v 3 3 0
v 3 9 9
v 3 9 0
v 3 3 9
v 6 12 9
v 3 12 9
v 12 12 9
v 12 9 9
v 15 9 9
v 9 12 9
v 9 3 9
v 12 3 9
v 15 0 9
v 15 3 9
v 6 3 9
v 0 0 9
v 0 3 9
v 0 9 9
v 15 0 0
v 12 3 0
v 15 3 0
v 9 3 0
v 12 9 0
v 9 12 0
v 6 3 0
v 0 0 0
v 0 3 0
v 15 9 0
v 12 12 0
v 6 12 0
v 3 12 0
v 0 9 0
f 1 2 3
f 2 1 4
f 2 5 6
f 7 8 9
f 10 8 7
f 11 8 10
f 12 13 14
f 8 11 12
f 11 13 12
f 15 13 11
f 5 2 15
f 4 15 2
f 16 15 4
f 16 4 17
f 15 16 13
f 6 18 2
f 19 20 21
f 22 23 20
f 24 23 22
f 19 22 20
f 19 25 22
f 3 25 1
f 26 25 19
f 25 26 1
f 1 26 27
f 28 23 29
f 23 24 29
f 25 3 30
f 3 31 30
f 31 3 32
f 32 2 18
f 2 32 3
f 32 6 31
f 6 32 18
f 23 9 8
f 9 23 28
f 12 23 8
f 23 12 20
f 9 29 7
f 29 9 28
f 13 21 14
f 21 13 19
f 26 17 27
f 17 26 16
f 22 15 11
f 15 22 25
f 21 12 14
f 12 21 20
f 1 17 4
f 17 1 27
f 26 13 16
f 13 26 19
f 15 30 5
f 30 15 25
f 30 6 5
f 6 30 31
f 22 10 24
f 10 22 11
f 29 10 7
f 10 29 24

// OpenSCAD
// Wall thickness
wt = 3;
// Pre-drill hole/groove depth
pd_groove_z = 1;
pd_groove_x = 1;
pd_hole_r = 1;
pd_hole_z = pd_groove_z;
// Grid spacing for the straight pre-drill grooves
pd_grid_xy = 5;
// Leave this much room around the edge without pre-drill grooves/holes.
pd_grid_clearance = 10;
// A list of radii for the circular pre-drill grooves
circles_r = [10, 20, 30];
// Overall width/height
unit_xy = 80;
unit_z = 50;
lid_screw_offset_x = wt*2;
lid_screw_shaft_r = 1.5;
lid_recess_grace = 0.4; // How much to shink the recessed part of the lid so it sockets into the base.

join_pin_x = 3*wt;
join_pin_z = join_pin_x;

// join_pin goes through the holes in the sides of the bases to lock them together.
module join_pin() {
    cube([join_pin_x+2*wt, wt, join_pin_z]);
    translate([wt,wt,0]) cube([join_pin_x, 2*wt, join_pin_z]);
    translate([wt*2,wt*3,0]) cube([wt, wt, join_pin_z]);
    translate([wt*2, wt*3,0]) rotate([0,0,90]) pin_barb();
    translate([wt*4, wt*4,0]) rotate([0,0,180]) pin_barb();

}

// join_pin_clip latches over the end of the join_pin to lock it into place
module join_pin_clip() {
    clip_scale = 1.1;
    scale([clip_scale, clip_scale, 1]) difference(){
        cube([join_pin_x+2*wt, 2*wt, join_pin_z]);
        translate([join_pin_x+2*wt, wt*5,0]) rotate([0,0,180]) join_pin();
    }
}

// pin_barb is a part of the join_pin
module pin_barb() {
    translate([wt/2, wt/2, join_pin_z/2]) difference() {
        cube([wt, wt, join_pin_z], center=true);
        rotate([0,0,45]) translate([-50,0,-join_pin_z/2]) cube([100,10,join_pin_z]);
    }
}

// spring_pin is a variant on the join_pin that uses a barbed spring arrangement
// rather than the two-piece version.
module spring_pin() {
    cube([join_pin_x+2*wt, wt, join_pin_z]);
    translate([wt,wt,0]) cube([join_pin_x/3, wt*3, join_pin_z]);
    translate([3*wt,wt,0]) cube([join_pin_x/3, wt*3, join_pin_z]);
    translate([0,3*wt,0]) rotate([0,0,0]) #pin_barb();
    translate([4*wt,4*wt,0]) rotate([0,0,270]) #pin_barb();
}
spring_pin();

// join_pin_holes is for chopping the locking holes in the sides of the base
module join_pin_holes() {
    ratio = 4;
    translate([unit_xy/ratio,0,0]) cube([join_pin_z, 200, join_pin_x], center=true);
    translate([-unit_xy/ratio,0,0]) cube([join_pin_z, 200, join_pin_x], center=true);
    rotate([0,0,90]) {
        translate([unit_xy/ratio,0,0]) cube([join_pin_z, 200, join_pin_x], center=true);
        translate([-unit_xy/ratio,0,0]) cube([join_pin_z, 200, join_pin_x], center=true);
    }
}

// grid_screw is an M3x20 cup head bolt by default
module lid_screw() {
    head_r = 3;
    bolt_head_protrusion_z = 3;
    head_z = 3-bolt_head_protrusion_z;
    shaft_r = lid_screw_shaft_r;
    shaft_z = 20;
    cylinder(r=head_r, h=head_z);
    translate([0,0,head_z]) cylinder(r=shaft_r, h=shaft_z, $fn=10);
}

// base_screw_post is one of the corner screw posts for the base.
module base_screw_post() {
    difference() {
        cylinder(r=lid_screw_shaft_r+wt, h=unit_z-wt*2);
        cylinder(r=lid_screw_shaft_r, h=unit_z-wt*2, $fn=10);
    }
}

// base_screw_posts are the four posts in the corners inside the
// base. These posts provide the holes for screws that hold the lid
// on, and also add rigidity to the base by reinforcing the corners.
module base_screw_posts() {
    intersection() {
        cube([unit_xy, unit_xy, unit_z-wt/2]);
        union() {
            translate([lid_screw_offset_x, lid_screw_offset_x, wt]) base_screw_post();
            translate([unit_xy-lid_screw_offset_x, lid_screw_offset_x, wt]) base_screw_post();
            translate([unit_xy-lid_screw_offset_x, unit_xy-lid_screw_offset_x, wt]) base_screw_post();
            translate([lid_screw_offset_x, unit_xy-lid_screw_offset_x, wt]) base_screw_post();
        }
    }
}

// base is the body of the module. Basically everything except the lid.
module base() {
    difference () {
        cube([unit_xy, unit_xy, unit_z-wt/2]);
        translate([wt, wt, wt]) cube([unit_xy-2*wt, unit_xy-2*wt, unit_z]);
        translate([unit_xy/2, unit_xy/2, unit_z/2]) join_pin_holes();
    }
    base_screw_posts();
}

module lid_whole() {
    cube([unit_xy, unit_xy, wt/2]);
    translate([wt+lid_recess_grace/2,wt+lid_recess_grace/2,wt/2])
        cube([unit_xy-wt*2-lid_recess_grace, unit_xy-wt*2-lid_recess_grace, wt/2]);
}

// lid_lines is half of the straight lines in the underside of the lid
module lid_lines() {
    for (x = [pd_grid_clearance:pd_grid_xy:unit_xy-pd_grid_clearance]) {
        translate([x-pd_groove_x/2, pd_grid_clearance, 0]) cube([pd_groove_x, unit_xy-2*pd_grid_clearance, 10]);
    }
}

// lid_grid is subtracted from the lid to provide the grid
// lines to assist with drilling accurately spaced holes or
// punching out neat sections. Currently unused.
module lid_grid() {
    // lid_lines();
    // translate([unit_xy, 0, 0]) rotate([0,0,90]) lid_lines();
    for (x = [pd_grid_clearance:pd_grid_xy:unit_xy-pd_grid_clearance]) {
        for (y = [pd_grid_clearance:pd_grid_xy:unit_xy-pd_grid_clearance]) {
            translate([x, y, 0]) cylinder(r=pd_hole_r, h=10, $fn=10);
        }
    }
}

// lid_circles is subtracted from the underside of the lid
// to make it easier to punch out portions of the lid to mount
// stuff.
module lid_circles() {
    for (r = circles_r) {
        difference() {
            cylinder(r=r+pd_groove_x/2, h=10);
            cylinder(r=r-pd_groove_x/2, h=10);
        }
    }
}

// lid is the lid of a module. The grooves argument lets you turn off the grooves for improved
// rendering speed.
module lid(grooves = 1) {
    difference() {
        lid_whole();
        lsox = lid_screw_offset_x;
        translate([lsox, lsox,0]) lid_screw();
        translate([unit_xy-lsox, lsox,0]) lid_screw();
        translate([unit_xy-lsox, unit_xy-lsox,0]) lid_screw();
        translate([lsox, unit_xy-lsox,0]) lid_screw();

        if (grooves) {
            translate([unit_xy/2, unit_xy/2, wt-pd_groove_z]) lid_circles();
            translate([0, 0, wt-pd_hole_z]) lid_grid();
        }
    }
}

// lid(1);

module assembled() {
    base();
    translate([0,unit_xy,unit_z])
        rotate([180,0,0])
            lid(0);
}
// join_pin_clip();
// translate([20,0,0]) join_pin();

// base();
// lid(1);
// difference() {
//     assembled();
//     translate([unit_xy/2,0,0]) cube([100,100,100]);
// }
// intersection() {
//     base();
//     translate([0,0,17.5]) cube([unit_xy, unit_xy,join_pin_x*1.5]);
// }
